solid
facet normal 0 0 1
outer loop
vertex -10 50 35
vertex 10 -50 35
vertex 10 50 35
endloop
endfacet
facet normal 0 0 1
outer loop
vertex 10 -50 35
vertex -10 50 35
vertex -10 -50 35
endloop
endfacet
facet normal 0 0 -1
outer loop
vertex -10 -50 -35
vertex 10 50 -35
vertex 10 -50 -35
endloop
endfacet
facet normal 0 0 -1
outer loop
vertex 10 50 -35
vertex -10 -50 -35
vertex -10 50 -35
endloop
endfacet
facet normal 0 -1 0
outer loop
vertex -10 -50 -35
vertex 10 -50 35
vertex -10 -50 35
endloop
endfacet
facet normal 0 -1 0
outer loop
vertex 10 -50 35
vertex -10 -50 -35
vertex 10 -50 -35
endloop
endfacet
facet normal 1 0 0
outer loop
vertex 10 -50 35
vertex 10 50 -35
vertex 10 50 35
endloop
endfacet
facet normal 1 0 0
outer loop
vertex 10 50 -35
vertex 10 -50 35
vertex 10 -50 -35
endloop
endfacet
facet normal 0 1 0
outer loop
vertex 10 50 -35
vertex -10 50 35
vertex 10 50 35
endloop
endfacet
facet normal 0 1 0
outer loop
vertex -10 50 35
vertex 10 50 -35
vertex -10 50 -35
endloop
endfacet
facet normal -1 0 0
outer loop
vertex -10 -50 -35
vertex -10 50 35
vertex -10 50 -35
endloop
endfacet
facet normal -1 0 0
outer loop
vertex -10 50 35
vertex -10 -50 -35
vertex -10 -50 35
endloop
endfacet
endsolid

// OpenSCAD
// ========================================
// a 20 x 100 x 70 mm box
// NeuroCAD canonical IR; dimensions are millimetres
// ========================================
$fn = 48;

cube(size=[20, 100, 70], center=true);
